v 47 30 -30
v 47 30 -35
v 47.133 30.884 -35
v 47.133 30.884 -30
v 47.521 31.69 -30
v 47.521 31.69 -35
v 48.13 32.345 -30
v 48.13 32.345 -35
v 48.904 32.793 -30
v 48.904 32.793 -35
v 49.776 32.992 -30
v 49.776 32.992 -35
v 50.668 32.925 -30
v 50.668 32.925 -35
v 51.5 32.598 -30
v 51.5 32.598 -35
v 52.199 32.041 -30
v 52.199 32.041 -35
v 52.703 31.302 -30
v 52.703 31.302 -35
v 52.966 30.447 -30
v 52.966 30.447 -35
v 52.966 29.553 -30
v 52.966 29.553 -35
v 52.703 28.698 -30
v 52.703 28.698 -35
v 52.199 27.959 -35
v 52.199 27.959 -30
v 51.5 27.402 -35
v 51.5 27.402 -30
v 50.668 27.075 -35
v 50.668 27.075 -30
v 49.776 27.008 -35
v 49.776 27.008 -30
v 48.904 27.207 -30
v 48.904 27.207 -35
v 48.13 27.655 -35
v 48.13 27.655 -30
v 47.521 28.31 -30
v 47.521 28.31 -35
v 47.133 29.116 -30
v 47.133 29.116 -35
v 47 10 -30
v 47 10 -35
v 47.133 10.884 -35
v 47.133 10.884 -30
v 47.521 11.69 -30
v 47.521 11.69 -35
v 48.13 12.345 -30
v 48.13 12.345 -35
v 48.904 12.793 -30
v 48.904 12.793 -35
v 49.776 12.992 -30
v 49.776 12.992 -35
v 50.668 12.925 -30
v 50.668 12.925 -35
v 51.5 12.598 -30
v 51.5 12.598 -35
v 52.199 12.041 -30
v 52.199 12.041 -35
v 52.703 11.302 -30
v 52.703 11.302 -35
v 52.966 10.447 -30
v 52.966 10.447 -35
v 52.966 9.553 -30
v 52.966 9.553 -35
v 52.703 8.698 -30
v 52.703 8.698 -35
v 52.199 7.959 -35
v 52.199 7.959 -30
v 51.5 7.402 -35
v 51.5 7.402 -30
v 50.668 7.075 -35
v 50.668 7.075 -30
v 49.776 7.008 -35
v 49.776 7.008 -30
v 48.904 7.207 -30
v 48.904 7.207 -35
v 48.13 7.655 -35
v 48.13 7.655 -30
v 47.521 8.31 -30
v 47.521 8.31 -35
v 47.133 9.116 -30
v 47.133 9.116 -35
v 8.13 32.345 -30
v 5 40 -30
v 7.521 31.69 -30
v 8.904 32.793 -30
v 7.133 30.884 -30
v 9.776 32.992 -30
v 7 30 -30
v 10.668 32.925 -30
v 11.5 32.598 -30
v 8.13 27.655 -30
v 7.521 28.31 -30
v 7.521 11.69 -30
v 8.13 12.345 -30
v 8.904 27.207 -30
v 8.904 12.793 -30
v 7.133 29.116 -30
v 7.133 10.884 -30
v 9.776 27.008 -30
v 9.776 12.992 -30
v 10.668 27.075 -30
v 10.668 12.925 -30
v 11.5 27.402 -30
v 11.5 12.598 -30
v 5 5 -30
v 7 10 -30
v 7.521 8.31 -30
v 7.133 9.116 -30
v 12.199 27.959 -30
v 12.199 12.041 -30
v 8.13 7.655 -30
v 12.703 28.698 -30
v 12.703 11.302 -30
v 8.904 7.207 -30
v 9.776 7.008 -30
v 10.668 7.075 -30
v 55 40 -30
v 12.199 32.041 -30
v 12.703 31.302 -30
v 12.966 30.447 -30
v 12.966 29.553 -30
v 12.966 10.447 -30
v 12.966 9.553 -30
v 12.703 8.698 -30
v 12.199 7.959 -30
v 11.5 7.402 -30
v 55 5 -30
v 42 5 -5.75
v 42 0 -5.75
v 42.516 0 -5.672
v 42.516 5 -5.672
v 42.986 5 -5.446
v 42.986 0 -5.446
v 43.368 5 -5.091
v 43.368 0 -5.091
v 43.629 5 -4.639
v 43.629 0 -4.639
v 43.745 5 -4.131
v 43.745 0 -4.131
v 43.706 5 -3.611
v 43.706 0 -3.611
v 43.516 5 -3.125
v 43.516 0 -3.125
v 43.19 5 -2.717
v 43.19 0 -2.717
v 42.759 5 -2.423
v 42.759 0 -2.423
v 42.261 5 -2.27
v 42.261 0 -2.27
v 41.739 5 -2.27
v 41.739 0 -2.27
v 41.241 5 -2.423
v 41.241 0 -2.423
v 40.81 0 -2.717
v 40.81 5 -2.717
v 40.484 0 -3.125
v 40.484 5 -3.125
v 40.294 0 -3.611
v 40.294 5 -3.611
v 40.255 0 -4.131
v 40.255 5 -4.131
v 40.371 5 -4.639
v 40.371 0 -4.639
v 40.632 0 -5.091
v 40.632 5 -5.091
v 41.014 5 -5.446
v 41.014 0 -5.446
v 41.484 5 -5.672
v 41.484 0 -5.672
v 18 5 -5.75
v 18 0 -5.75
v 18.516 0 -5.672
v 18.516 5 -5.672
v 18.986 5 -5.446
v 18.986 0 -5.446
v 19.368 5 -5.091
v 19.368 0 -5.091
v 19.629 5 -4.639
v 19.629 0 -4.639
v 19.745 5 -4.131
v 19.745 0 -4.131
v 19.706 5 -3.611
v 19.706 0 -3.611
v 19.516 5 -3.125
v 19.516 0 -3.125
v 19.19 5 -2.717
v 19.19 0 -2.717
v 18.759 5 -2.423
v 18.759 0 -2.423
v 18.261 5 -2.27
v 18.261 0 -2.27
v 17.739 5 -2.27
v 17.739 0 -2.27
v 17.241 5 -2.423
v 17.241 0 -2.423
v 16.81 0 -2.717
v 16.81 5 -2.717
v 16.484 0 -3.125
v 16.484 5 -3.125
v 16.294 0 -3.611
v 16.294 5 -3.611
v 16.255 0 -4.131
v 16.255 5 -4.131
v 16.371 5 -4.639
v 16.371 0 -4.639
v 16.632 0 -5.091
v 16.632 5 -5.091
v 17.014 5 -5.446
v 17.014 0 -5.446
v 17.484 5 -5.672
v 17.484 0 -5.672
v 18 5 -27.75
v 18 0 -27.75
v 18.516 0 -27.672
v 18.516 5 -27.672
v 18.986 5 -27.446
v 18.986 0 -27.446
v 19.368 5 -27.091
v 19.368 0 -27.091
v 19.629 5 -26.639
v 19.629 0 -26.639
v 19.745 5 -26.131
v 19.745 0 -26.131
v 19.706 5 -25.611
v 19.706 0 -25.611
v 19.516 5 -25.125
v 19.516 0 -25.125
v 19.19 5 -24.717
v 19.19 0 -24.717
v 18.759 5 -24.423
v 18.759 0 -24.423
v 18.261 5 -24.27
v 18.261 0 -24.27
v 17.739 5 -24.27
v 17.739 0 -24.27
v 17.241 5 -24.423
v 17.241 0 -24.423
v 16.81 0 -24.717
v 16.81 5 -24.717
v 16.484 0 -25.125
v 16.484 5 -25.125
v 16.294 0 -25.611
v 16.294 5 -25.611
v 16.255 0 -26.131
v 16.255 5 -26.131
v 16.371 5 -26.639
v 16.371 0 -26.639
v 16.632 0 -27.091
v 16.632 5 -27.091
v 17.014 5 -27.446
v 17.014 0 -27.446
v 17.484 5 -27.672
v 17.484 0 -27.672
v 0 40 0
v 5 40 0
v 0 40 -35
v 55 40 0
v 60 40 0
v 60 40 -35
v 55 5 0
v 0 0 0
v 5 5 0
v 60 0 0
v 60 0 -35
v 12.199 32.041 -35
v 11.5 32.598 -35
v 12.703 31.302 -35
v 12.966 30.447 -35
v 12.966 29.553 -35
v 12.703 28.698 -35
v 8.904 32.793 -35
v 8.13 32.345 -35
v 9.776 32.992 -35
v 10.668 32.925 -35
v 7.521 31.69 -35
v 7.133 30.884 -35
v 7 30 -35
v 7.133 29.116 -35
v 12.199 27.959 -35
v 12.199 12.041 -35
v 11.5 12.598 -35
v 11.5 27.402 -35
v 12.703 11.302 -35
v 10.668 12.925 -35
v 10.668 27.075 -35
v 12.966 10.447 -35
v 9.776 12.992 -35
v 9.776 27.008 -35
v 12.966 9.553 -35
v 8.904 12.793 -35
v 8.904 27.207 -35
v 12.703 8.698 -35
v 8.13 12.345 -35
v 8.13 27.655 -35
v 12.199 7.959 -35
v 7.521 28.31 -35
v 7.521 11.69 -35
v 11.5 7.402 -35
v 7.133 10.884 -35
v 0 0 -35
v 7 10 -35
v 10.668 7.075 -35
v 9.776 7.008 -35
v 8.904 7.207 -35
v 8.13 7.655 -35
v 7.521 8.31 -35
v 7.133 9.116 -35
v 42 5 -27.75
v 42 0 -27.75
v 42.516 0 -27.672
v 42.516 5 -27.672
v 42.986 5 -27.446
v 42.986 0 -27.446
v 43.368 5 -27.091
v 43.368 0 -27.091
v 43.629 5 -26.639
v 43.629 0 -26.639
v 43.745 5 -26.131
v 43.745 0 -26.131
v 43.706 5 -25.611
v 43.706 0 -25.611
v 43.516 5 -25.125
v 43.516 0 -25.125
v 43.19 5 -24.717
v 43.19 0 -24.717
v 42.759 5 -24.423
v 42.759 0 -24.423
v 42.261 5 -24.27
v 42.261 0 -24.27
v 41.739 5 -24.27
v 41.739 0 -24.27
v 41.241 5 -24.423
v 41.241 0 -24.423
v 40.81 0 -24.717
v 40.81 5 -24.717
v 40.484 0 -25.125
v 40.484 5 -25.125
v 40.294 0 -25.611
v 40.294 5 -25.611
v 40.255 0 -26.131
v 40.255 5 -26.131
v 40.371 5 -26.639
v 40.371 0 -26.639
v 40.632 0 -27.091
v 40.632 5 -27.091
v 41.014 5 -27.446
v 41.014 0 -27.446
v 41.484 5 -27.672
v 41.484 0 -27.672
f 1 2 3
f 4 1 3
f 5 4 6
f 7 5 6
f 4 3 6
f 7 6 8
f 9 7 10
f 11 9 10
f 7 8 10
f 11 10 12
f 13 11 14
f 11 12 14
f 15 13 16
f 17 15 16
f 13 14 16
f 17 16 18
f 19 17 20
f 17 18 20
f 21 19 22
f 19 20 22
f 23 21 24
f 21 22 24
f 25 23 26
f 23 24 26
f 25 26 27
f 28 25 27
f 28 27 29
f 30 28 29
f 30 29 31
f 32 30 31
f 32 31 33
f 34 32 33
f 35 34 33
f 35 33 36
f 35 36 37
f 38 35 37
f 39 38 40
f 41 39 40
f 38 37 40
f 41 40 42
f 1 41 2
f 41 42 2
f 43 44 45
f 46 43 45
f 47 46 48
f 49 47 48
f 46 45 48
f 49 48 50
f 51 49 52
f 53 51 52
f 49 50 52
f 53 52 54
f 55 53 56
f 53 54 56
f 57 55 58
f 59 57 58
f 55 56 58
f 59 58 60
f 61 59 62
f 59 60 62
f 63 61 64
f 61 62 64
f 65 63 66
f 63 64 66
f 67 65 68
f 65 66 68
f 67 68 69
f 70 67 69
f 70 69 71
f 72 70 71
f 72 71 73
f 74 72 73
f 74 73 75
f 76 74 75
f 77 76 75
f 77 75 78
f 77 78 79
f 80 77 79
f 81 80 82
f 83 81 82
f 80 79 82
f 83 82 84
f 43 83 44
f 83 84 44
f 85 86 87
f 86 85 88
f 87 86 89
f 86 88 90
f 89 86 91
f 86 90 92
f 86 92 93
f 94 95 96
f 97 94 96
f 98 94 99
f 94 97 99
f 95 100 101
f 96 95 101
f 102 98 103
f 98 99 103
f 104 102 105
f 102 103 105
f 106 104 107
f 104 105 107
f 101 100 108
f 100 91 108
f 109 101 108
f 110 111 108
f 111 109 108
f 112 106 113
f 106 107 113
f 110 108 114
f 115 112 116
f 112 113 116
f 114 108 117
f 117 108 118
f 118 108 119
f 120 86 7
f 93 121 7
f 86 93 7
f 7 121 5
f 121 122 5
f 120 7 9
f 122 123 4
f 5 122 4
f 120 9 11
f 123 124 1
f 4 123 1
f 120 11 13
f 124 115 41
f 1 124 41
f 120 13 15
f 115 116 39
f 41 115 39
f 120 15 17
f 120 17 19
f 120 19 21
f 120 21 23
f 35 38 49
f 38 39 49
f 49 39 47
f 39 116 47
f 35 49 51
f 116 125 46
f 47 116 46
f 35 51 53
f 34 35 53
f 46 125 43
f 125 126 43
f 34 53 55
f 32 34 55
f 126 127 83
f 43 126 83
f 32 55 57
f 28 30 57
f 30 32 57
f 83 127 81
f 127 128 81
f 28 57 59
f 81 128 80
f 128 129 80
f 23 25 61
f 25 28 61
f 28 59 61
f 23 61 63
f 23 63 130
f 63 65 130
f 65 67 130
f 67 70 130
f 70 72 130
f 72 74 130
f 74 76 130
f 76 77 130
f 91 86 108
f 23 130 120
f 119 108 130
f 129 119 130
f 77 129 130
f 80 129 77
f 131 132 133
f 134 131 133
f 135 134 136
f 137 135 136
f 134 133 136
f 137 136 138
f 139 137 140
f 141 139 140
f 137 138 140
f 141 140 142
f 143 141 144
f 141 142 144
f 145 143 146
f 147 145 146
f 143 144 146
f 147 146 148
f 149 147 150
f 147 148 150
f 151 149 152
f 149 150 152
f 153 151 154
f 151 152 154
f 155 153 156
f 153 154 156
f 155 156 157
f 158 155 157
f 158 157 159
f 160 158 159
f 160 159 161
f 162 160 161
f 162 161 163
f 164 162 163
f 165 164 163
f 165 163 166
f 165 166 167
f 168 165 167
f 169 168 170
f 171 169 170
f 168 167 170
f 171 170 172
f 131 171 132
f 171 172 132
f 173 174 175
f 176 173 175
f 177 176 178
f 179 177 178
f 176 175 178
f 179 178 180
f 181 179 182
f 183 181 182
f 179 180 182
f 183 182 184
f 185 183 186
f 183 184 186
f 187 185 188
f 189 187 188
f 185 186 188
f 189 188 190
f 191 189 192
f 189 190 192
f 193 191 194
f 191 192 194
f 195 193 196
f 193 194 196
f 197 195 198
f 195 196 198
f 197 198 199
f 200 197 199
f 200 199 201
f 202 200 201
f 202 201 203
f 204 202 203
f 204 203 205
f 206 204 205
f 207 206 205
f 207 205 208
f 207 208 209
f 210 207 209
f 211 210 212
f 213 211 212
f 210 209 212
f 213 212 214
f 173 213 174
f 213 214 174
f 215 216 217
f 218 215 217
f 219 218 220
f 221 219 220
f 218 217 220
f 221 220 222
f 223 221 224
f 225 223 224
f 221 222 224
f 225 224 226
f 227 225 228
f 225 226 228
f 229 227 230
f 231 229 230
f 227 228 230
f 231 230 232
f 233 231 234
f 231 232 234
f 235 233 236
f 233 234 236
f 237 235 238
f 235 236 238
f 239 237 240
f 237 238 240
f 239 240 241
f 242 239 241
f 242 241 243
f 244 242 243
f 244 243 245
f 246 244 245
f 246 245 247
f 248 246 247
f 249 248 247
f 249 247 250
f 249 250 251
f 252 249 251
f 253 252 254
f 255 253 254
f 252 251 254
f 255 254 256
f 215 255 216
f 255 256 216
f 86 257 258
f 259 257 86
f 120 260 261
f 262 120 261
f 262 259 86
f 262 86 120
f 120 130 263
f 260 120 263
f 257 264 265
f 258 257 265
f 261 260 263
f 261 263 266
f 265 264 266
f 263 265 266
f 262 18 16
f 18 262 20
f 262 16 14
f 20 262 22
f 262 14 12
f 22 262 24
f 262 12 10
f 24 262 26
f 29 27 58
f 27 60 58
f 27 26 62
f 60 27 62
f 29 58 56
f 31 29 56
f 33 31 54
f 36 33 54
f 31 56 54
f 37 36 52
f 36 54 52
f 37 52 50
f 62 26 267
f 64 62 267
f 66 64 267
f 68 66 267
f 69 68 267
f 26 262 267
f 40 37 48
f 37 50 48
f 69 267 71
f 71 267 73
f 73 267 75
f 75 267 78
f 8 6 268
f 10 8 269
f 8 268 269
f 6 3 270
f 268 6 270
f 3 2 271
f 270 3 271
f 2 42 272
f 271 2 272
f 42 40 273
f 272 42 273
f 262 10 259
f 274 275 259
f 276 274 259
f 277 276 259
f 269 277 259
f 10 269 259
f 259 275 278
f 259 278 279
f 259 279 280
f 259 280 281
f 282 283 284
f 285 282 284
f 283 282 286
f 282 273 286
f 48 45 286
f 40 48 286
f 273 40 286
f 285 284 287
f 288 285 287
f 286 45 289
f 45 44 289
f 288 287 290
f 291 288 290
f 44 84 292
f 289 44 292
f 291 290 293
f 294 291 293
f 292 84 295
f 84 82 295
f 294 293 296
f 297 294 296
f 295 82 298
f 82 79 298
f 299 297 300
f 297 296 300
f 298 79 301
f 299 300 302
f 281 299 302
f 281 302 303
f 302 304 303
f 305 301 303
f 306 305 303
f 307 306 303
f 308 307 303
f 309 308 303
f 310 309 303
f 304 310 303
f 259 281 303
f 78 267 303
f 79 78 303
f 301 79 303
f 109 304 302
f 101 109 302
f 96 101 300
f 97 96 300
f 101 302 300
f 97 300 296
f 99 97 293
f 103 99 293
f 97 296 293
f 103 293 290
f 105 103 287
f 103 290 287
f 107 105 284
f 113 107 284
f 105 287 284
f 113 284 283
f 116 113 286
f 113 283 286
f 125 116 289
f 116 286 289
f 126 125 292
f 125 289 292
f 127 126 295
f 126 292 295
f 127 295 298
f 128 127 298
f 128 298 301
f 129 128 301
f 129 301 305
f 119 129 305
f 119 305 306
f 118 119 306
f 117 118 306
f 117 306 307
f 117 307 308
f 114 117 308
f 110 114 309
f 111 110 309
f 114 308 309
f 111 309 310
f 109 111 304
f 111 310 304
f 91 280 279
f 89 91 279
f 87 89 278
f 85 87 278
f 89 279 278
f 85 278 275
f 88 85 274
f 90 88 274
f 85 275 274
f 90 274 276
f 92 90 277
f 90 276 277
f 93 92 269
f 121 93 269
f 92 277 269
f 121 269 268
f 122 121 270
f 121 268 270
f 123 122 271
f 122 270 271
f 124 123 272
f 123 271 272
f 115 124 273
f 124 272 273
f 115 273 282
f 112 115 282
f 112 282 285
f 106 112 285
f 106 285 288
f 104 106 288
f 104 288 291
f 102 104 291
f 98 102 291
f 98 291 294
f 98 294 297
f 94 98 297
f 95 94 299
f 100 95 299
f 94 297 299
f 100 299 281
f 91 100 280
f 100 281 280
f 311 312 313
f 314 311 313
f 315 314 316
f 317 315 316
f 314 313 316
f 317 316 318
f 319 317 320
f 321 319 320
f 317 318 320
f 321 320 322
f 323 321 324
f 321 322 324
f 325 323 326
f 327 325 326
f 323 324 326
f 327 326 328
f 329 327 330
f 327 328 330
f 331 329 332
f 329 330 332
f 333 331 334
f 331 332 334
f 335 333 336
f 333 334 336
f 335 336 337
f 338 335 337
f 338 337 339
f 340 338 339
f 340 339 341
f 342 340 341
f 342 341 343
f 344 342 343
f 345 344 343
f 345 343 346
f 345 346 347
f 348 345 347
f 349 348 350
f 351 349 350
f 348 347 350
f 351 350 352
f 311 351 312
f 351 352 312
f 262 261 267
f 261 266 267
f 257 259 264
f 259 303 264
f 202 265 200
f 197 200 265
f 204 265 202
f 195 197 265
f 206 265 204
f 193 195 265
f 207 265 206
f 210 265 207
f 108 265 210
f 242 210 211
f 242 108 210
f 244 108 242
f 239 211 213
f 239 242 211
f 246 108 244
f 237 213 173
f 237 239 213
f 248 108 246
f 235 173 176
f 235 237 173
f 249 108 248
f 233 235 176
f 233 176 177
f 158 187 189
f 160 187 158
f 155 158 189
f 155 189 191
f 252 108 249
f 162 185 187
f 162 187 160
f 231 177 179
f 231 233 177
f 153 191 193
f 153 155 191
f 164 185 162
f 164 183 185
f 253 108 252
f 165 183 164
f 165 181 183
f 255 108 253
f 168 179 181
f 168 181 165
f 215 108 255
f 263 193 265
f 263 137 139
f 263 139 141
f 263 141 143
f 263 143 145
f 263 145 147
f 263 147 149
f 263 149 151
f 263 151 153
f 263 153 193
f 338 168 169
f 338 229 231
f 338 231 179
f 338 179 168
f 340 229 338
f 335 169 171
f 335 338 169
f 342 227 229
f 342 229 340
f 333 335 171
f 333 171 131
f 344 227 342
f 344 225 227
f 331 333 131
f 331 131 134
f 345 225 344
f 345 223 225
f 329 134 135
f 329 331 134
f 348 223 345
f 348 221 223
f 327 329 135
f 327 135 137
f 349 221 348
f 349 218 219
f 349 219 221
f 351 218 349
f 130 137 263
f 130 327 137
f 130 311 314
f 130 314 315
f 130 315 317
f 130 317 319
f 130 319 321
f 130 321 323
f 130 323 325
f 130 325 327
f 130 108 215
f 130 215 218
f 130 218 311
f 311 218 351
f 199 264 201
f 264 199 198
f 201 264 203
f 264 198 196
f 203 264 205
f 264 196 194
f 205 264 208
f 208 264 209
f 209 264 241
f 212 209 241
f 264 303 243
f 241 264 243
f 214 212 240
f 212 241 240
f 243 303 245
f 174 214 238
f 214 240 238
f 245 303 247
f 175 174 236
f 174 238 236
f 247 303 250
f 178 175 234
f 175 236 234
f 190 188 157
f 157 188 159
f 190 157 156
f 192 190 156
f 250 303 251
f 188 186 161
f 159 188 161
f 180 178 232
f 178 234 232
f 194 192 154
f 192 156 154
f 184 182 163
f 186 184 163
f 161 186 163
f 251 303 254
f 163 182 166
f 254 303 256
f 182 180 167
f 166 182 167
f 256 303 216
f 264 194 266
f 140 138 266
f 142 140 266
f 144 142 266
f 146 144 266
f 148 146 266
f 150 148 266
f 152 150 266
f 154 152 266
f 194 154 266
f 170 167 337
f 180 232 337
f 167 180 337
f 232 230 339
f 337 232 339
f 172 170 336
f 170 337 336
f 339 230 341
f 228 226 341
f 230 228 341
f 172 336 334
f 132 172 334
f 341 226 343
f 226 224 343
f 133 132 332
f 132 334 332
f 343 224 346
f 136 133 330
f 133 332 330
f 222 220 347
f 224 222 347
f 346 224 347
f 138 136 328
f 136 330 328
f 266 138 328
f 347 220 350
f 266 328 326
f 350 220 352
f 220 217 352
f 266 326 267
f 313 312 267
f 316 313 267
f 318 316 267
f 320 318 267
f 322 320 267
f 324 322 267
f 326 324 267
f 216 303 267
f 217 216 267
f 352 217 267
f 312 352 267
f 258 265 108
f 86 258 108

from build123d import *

# Parameters (mm, degrees)
SKETCH_1_W          = 60
SKETCH_1_H          = 35
EXTRUDE_1_DEPTH     = 5
EXTRUDE_2_DEPTH     = 35
SKETCH_4_R          = 3
CUT_EXTRUDE_1_DEPTH = 5
SKETCH_5_R          = 1.75
CUT_EXTRUDE_2_DEPTH = 5


with BuildPart() as part:
    # Эскиз1 → Бобышка-Вытянуть1 (new body)
    with BuildSketch(Plane(origin=(0, 0, 0), x_dir=(1, 0, 0), z_dir=(0, 1, 0))):
        with Locations((30, 17.5)):
            Rectangle(SKETCH_1_W, SKETCH_1_H)
    extrude(amount=EXTRUDE_1_DEPTH)

    # Эскиз3 → Бобышка-Вытянуть2 (add)
    with BuildSketch(Plane(origin=(0, 5, 0), x_dir=(1, 0, 0), z_dir=(0, 1, 0))):
        Polygon((5, 30), (55, 30), (55, 0), (60, 0), (60, 35), (0, 35), (0, 0), (5, 0), align=None)
    extrude(amount=EXTRUDE_2_DEPTH)

    # Эскиз4 → Вырез-Вытянуть1 (cut)
    with BuildSketch(Plane(origin=(0, 0, -35), x_dir=(-1, 0, 0), z_dir=(0, 0, -1))):
        with Locations((-10, 10)):
            Circle(SKETCH_4_R)
        with Locations((-10, 30)):
            Circle(SKETCH_4_R)
        with Locations((-50, 30)):
            Circle(SKETCH_4_R)
        with Locations((-50, 10)):
            Circle(SKETCH_4_R)
    extrude(amount=-CUT_EXTRUDE_1_DEPTH, mode=Mode.SUBTRACT)

    # Эскиз5 → Вырез-Вытянуть2 (cut)
    with BuildSketch(Plane(origin=(0, 0, 0), x_dir=(-1, 0, 0), z_dir=(0, -1, 0))):
        with Locations(Location((-42, 26, 0), (0, 0, 90))):
            Circle(SKETCH_5_R)
        with Locations(Location((-18, 26, 0), (0, 0, 90))):
            Circle(SKETCH_5_R)
        with Locations(Location((-18, 4, 0), (0, 0, 90))):
            Circle(SKETCH_5_R)
        with Locations(Location((-42, 4, 0), (0, 0, 90))):
            Circle(SKETCH_5_R)
    extrude(amount=-CUT_EXTRUDE_2_DEPTH, mode=Mode.SUBTRACT)


solid = part.part
